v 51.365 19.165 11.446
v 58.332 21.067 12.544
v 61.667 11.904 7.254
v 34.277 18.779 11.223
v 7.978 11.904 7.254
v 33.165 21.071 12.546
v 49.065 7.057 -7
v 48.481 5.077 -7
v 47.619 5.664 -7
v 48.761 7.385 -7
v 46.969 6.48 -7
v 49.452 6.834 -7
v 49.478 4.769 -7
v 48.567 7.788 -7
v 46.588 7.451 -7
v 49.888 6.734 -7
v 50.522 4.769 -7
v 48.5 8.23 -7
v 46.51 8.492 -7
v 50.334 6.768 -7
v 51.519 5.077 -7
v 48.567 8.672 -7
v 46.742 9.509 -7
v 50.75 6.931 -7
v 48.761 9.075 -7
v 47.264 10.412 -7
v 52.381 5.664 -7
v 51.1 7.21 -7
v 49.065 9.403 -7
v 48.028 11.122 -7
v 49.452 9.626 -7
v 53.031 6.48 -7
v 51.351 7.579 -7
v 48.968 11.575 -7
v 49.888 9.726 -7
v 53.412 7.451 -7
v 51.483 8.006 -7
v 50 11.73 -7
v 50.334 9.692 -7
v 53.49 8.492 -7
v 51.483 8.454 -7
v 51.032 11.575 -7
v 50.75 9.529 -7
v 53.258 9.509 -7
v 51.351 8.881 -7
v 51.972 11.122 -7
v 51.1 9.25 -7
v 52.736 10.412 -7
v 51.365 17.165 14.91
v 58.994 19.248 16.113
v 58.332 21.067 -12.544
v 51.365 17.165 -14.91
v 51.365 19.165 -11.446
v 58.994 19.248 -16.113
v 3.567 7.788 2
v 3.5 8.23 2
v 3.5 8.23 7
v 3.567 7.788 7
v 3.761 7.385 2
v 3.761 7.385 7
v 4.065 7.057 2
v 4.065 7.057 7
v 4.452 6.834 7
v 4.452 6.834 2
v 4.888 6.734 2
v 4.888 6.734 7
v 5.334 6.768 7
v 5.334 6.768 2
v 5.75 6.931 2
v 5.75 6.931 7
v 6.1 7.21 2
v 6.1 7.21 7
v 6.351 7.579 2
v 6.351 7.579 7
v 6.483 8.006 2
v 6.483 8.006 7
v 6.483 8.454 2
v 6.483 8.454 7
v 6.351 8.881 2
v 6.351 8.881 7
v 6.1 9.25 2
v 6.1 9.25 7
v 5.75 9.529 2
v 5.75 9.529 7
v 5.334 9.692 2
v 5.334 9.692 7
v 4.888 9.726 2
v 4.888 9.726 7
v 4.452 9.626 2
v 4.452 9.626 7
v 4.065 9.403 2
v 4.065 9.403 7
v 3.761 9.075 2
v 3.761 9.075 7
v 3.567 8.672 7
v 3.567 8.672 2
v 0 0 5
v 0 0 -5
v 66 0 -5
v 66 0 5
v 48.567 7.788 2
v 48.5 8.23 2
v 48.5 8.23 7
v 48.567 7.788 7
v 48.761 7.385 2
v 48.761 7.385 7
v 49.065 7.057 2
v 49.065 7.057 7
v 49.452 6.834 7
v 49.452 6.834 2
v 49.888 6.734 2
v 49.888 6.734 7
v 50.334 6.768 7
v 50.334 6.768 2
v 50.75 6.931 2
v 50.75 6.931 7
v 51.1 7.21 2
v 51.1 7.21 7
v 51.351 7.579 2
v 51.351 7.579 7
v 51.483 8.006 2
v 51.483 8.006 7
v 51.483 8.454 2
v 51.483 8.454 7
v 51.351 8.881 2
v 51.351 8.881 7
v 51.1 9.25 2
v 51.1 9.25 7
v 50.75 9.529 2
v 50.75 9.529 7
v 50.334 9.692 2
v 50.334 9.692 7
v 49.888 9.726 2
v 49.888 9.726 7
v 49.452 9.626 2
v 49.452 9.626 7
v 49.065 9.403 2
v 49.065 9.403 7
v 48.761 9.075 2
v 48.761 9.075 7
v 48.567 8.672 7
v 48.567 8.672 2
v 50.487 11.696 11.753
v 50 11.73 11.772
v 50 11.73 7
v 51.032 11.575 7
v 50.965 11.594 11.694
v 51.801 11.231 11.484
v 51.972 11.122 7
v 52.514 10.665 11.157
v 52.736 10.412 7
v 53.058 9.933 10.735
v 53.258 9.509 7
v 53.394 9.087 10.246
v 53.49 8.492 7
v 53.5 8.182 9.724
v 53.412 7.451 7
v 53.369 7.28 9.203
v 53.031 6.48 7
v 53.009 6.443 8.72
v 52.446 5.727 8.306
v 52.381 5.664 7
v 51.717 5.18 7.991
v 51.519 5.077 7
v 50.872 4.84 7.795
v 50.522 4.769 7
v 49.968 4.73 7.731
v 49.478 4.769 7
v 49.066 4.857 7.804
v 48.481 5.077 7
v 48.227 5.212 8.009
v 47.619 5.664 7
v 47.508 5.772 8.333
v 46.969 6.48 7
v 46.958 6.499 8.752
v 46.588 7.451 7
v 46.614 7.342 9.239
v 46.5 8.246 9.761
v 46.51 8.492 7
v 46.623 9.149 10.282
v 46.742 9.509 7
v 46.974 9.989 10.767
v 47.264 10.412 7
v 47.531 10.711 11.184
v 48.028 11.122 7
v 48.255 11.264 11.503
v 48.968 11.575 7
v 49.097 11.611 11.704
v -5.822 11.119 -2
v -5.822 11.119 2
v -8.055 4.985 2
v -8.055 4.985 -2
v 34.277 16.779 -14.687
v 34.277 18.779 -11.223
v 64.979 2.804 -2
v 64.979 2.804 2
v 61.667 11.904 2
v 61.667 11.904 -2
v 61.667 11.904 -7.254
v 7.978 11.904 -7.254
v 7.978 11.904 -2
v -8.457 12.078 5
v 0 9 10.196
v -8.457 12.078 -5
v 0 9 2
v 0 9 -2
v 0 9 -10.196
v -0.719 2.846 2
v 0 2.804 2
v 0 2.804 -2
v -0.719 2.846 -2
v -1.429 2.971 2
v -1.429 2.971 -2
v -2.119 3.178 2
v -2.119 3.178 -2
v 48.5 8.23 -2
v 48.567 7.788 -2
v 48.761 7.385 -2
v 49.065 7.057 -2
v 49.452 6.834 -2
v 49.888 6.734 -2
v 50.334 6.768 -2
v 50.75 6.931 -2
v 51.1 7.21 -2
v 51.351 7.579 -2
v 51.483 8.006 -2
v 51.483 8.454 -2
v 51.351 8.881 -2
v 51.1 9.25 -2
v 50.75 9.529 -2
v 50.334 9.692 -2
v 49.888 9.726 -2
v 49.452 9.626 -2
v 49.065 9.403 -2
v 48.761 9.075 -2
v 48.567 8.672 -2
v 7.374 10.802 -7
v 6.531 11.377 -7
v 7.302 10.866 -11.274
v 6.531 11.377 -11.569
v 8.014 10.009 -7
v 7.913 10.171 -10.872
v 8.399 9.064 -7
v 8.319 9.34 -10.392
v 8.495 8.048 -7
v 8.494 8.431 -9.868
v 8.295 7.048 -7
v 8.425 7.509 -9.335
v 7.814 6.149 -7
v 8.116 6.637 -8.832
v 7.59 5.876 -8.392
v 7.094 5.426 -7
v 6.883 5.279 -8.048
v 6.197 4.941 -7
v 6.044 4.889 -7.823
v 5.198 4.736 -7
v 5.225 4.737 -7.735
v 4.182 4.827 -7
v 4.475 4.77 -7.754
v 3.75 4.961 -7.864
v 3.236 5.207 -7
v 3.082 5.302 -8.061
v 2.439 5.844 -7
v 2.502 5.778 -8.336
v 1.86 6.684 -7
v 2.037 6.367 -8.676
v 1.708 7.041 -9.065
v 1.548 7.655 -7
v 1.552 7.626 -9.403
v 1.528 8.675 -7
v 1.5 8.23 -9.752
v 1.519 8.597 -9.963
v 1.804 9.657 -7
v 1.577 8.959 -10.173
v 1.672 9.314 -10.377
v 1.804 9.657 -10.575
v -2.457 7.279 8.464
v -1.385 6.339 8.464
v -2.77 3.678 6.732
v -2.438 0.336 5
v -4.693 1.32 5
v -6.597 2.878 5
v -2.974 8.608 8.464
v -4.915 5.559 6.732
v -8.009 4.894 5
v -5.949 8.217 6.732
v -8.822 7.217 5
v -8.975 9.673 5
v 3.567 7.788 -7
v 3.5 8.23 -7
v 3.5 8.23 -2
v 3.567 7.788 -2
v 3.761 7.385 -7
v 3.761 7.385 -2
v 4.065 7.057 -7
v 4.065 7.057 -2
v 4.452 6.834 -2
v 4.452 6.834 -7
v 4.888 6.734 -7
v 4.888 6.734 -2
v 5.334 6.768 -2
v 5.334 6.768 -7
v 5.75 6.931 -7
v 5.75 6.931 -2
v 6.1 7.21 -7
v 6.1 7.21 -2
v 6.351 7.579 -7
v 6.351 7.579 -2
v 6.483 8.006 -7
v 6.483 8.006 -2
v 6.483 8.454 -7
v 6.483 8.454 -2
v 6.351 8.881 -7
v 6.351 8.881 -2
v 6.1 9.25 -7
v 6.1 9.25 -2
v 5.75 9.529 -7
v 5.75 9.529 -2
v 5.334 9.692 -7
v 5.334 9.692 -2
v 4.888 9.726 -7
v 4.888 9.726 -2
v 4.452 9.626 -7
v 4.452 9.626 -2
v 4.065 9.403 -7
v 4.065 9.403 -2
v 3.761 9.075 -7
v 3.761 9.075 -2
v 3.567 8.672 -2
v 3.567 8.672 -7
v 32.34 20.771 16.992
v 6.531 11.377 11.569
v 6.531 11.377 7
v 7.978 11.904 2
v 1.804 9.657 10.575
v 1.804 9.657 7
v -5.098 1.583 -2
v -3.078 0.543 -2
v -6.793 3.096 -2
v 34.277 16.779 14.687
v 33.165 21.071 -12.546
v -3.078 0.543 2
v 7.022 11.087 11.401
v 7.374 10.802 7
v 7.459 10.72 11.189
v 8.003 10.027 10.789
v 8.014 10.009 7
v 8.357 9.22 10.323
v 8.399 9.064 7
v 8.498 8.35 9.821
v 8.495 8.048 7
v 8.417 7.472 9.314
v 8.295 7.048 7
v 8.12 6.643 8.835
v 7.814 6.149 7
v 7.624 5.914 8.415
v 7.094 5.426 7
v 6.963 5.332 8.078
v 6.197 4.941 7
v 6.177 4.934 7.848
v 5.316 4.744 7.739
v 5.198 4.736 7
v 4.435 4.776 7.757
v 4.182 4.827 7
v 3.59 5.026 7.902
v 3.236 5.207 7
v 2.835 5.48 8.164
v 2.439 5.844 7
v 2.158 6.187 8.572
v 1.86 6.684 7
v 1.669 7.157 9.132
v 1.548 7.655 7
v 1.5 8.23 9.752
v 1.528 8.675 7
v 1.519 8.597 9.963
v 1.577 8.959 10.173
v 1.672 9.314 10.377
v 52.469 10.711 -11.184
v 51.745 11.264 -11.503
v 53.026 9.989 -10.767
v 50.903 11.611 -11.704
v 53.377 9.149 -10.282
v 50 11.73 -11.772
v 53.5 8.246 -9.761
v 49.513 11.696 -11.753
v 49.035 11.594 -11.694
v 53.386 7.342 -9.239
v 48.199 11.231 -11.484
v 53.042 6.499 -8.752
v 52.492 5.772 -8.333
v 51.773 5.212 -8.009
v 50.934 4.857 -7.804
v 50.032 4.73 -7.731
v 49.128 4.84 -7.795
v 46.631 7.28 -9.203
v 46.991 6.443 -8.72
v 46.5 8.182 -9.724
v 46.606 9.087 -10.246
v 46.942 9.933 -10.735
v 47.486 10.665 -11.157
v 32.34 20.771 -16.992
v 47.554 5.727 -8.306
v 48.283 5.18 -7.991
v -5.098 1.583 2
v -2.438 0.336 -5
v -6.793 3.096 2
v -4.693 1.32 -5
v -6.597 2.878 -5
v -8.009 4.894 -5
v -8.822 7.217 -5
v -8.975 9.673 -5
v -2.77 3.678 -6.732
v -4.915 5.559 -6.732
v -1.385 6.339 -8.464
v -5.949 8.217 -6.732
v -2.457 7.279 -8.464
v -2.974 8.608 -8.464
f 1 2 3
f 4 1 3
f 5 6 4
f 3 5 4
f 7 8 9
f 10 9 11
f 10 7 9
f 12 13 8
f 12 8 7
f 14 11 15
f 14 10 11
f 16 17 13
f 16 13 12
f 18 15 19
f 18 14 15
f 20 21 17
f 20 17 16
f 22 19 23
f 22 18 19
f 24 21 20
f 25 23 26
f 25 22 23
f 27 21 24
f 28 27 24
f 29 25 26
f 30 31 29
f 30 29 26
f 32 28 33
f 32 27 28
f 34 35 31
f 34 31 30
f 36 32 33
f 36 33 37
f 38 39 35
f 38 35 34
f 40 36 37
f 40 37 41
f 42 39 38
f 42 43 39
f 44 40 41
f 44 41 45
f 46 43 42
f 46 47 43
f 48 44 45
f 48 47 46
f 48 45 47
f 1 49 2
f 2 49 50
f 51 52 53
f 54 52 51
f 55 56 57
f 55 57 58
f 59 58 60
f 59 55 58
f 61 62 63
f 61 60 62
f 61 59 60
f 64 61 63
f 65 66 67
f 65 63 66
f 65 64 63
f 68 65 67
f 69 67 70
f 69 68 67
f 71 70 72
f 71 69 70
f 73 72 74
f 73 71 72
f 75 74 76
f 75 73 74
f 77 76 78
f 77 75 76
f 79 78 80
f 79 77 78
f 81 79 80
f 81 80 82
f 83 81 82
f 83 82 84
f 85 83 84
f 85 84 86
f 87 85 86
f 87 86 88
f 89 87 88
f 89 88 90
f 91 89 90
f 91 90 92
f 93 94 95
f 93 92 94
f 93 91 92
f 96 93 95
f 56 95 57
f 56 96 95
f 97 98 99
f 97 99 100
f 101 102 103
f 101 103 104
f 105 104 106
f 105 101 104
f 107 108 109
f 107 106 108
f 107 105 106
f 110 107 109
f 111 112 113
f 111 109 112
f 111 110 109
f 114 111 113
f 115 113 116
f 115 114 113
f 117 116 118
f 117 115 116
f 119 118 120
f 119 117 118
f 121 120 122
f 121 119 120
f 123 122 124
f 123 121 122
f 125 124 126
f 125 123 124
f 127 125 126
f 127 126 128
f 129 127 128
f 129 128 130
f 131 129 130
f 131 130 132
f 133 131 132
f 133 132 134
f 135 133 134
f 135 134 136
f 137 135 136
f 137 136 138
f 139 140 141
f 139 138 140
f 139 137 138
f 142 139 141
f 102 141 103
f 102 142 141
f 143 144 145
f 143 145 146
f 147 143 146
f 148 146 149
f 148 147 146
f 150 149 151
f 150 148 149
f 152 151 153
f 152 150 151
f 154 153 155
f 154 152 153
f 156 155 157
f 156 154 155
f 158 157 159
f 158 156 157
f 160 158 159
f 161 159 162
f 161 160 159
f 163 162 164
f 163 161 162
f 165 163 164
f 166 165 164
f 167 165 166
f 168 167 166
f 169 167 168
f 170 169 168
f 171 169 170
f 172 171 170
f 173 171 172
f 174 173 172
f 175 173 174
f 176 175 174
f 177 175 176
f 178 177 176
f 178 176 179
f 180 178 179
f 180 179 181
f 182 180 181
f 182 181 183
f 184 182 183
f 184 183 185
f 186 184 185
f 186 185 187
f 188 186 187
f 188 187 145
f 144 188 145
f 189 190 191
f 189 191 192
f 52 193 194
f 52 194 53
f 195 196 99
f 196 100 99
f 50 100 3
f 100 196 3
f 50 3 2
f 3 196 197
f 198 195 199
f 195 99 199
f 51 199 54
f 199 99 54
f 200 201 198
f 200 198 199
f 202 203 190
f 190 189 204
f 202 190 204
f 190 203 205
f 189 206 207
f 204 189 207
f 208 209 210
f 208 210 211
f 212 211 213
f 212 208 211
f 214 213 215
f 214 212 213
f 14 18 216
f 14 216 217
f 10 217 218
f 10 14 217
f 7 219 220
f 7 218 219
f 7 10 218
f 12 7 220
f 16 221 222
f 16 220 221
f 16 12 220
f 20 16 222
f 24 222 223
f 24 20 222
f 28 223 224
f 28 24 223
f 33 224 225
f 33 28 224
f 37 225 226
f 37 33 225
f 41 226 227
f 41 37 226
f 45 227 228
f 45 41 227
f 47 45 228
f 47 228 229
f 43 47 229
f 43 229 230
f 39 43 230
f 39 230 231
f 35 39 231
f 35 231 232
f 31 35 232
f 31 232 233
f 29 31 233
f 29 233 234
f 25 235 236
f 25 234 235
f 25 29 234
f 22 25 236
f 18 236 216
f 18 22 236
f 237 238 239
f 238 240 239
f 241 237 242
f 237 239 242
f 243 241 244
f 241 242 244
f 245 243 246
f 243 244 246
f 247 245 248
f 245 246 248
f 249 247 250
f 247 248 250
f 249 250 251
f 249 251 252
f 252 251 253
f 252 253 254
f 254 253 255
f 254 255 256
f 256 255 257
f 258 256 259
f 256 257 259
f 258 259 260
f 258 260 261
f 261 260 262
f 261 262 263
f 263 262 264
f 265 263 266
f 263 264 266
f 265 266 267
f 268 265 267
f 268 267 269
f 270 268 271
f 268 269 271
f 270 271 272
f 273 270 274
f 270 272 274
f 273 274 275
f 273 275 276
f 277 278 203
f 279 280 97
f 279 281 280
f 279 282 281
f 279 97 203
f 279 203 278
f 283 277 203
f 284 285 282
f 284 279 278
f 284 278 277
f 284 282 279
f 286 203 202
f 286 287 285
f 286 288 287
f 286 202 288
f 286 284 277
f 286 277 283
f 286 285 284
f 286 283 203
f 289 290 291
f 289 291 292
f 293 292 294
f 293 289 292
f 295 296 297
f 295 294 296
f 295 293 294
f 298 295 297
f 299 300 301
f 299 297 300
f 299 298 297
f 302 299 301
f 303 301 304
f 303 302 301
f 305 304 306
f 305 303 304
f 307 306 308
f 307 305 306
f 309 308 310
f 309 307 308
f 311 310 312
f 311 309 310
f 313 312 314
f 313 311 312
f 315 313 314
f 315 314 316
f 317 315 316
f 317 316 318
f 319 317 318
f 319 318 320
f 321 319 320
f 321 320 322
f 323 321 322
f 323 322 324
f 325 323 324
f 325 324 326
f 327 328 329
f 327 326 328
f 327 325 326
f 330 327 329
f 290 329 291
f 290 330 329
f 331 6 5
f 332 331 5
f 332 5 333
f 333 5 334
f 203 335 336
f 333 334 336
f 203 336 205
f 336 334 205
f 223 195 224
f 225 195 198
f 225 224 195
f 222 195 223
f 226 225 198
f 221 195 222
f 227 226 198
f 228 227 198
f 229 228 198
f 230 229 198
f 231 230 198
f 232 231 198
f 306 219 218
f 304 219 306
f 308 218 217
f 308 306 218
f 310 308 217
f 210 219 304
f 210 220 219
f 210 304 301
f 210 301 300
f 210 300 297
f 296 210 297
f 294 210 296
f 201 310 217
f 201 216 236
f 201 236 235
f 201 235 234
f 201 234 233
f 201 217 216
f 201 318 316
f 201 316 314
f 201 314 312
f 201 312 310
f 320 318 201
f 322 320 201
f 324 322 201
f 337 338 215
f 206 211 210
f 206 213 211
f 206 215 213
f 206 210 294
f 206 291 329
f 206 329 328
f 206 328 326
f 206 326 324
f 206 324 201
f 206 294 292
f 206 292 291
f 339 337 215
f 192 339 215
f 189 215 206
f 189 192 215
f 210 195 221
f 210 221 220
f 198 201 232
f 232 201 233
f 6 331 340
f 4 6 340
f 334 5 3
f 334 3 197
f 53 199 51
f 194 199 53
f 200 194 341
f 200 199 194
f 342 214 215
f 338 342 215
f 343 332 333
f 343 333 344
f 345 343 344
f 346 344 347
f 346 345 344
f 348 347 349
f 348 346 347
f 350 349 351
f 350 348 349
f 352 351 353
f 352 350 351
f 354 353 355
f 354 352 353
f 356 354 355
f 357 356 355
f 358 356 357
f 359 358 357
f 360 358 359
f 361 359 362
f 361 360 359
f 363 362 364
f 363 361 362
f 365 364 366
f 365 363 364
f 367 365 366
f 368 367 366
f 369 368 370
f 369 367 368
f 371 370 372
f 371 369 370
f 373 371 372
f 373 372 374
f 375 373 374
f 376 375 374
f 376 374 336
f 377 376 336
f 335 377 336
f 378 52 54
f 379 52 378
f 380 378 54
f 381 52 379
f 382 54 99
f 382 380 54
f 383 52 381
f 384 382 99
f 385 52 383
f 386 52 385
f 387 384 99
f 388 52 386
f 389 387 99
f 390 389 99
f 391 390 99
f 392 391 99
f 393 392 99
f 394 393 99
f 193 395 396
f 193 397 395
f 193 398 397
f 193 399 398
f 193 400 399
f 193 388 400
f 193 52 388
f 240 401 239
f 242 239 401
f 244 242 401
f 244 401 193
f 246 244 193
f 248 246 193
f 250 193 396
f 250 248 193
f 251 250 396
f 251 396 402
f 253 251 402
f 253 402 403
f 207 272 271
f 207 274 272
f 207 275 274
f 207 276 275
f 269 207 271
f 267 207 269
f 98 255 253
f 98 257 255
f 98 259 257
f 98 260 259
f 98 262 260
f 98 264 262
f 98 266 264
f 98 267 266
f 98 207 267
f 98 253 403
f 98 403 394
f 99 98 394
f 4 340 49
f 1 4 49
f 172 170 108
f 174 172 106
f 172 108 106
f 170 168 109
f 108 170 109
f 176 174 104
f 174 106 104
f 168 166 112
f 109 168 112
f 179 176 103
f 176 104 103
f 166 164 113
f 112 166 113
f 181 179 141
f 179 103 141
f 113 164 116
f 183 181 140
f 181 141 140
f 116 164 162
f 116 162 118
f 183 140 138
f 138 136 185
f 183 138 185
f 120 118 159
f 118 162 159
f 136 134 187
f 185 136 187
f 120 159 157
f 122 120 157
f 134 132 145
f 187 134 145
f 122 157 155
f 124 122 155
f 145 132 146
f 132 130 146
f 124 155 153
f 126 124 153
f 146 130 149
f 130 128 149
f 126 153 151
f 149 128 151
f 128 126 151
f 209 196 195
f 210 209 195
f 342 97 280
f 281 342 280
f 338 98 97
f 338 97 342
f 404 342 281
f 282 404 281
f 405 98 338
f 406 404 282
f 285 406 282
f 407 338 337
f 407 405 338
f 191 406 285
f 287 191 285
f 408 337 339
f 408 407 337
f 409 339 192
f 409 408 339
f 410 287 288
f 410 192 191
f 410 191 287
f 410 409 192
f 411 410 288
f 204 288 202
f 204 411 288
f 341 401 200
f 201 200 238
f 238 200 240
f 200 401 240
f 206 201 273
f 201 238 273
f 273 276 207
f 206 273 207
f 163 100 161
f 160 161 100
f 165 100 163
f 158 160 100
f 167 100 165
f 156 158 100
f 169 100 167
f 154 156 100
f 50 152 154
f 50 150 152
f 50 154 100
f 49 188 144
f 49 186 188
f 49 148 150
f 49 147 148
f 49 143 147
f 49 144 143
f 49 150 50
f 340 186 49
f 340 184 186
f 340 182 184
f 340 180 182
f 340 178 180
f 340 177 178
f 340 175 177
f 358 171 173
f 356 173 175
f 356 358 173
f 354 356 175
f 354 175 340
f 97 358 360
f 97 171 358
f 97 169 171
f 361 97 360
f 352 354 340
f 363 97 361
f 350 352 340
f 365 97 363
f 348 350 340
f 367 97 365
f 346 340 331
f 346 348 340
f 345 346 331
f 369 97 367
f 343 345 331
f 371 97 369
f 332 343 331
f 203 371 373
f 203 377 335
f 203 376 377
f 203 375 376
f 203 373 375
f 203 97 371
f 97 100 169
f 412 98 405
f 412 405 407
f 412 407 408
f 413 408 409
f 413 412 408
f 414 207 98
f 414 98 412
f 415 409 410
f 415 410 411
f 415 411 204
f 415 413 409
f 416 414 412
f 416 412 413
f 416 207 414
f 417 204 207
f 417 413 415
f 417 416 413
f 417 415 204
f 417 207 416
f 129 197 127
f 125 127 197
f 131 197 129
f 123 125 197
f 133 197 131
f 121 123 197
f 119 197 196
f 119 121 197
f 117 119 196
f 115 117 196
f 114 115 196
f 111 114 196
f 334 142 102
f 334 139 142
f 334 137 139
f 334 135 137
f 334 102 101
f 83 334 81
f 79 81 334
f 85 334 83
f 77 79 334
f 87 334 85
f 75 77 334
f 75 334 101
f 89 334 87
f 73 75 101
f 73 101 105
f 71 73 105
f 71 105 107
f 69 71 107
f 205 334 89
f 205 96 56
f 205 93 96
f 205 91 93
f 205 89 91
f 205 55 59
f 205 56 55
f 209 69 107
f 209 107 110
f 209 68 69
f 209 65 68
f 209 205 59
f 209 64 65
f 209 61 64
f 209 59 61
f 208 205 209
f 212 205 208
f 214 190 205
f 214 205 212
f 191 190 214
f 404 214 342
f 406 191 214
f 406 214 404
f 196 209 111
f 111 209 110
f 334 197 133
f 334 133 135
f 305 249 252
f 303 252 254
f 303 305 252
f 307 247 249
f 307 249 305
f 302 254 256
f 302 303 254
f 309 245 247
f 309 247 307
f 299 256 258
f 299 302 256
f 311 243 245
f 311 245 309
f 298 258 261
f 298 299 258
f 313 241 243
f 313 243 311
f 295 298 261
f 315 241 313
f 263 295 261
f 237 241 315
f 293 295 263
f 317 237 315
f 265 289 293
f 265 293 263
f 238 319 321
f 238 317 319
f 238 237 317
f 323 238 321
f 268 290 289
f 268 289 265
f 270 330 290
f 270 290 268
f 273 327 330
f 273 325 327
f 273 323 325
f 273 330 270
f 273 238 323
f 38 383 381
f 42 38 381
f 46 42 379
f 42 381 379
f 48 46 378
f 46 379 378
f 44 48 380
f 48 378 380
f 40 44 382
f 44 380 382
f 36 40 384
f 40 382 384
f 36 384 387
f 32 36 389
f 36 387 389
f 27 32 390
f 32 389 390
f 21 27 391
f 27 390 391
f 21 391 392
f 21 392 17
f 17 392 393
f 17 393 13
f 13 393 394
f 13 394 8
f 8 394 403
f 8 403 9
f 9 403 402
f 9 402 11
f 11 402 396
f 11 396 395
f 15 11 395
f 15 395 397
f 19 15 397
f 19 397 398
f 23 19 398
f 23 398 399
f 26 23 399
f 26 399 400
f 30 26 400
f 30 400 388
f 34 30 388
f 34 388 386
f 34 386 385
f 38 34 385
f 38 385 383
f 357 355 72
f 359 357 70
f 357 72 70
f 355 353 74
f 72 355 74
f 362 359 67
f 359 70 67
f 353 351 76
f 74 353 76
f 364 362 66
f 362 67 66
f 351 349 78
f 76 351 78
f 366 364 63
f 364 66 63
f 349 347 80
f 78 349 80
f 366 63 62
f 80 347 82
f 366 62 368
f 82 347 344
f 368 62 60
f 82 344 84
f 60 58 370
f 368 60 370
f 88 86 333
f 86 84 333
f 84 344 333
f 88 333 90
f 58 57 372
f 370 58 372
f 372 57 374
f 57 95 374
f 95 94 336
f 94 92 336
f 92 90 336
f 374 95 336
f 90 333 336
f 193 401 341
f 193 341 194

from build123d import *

# Parameters (mm, degrees)
EXTRUDE_1_DEPTH          = 66
CUT_EXTRUDE_1_DEPTH      = 66
CUT_EXTRUDE_1_DEPTH_BACK = 66
SKETCH_2_R               = 1.5
SKETCH_4_R               = 3.5
CUT_EXTRUDE_2_DEPTH      = 5
CUT_EXTRUDE_3_DEPTH      = 66
REVOLVE_1_ANGLE          = 110
SKETCH_7_W               = 6.196152423
SKETCH_7_H               = 4
CUT_EXTRUDE_4_DEPTH      = 66


with BuildPart() as part:
    # 草图1 → 凸台-拉伸1 (new body)
    with BuildSketch(Plane(origin=(0, 0, 0), x_dir=(0, 0, -1), z_dir=(1, 0, 0))):
        Polygon((5, 0), (-5, 0), (-25, 34.641016151), (-21.535898385, 36.641016151), (-7.25388745, 11.903847577), (-2, 11.903847577), (-2, 2.803847577), (2, 2.803847577), (2, 11.903847577), (7.25388745, 11.903847577), (21.535898385, 36.641016151), (25, 34.641016151), align=None)
    extrude(amount=EXTRUDE_1_DEPTH)

    # 草图2 → 切除-拉伸1 (cut, two sides: drawn at the far end of the back side and taken through both)
    with BuildSketch(Plane.XY.offset(-CUT_EXTRUDE_1_DEPTH_BACK)):
        with Locations(Location((5, 8.23, 0), (0, 0, 180))):
            Circle(SKETCH_2_R)
        with Locations(Location((50, 8.23, 0), (0, 0, 180))):
            Circle(SKETCH_2_R)
        Polygon((0, 9), (0, 36.641016151), (75.943067727, 36.641016151), (66, 33.022035462), (66, 0), (55.386922379, 29.159191114), align=None)
    extrude(amount=CUT_EXTRUDE_1_DEPTH + CUT_EXTRUDE_1_DEPTH_BACK, mode=Mode.SUBTRACT)

    # 草图4 → 切除-拉伸2 (cut)
    with BuildSketch(Plane(origin=(0, 0, 12), x_dir=(-1, 0, 0), z_dir=(0, 0, -1))):
        with Locations((-5, 8.23)):
            Circle(SKETCH_4_R)
        with Locations(Location((-50, 8.23, 0), (0, 0, 90))):
            Circle(SKETCH_4_R)
    cut_extrude_2 = extrude(amount=CUT_EXTRUDE_2_DEPTH, mode=Mode.SUBTRACT)

    # 镜向1: 切除-拉伸2 across plane
    add(cut_extrude_2.mirror(Plane.XY), mode=Mode.SUBTRACT)

    # 草图5 → 切除-拉伸3 (cut)
    with BuildSketch(Plane(origin=(0, -2.165063509, 3.75), x_dir=(1, 0, 0), z_dir=(0, -0.5000000000000011, 0.8660254037844382))):
        Polygon((32.339646553, 26.483902367), (34.276892815, 21.874447202), (51.364505918, 22.320217945), (58.994441321, 24.725230573), (55.386922379, 36.170133678), align=None)
    cut_extrude_3 = extrude(amount=-CUT_EXTRUDE_3_DEPTH, mode=Mode.SUBTRACT)

    # 镜向2: 切除-拉伸3 across plane
    add(cut_extrude_3.mirror(Plane.XY), mode=Mode.SUBTRACT)

    # 草图6 → 旋转1 (revolve)
    with BuildSketch(Plane.ZY):
        Polygon((-10.196152423, 9), (-2, 9), (-2, 2.803847577), (2, 2.803847577), (2, 9), (10.196152423, 9), (5, 0), (-5, 0), align=None)
    revolve(axis=Axis((0, 9, -10.196152423), (0, 0, -1)), revolution_arc=REVOLVE_1_ANGLE)

    # 草图7 → 切除-拉伸4 (cut)
    with BuildSketch(Plane(origin=(2.892544244, 7.947199994, 0), x_dir=(0.939692620785907, -0.34202014332567265, 0), z_dir=(0.34202014332567265, 0.939692620785907, 0))):
        with Locations((-6.176257502, 0)):
            Rectangle(SKETCH_7_W, SKETCH_7_H)
    extrude(amount=-CUT_EXTRUDE_4_DEPTH, mode=Mode.SUBTRACT)


solid = part.part
